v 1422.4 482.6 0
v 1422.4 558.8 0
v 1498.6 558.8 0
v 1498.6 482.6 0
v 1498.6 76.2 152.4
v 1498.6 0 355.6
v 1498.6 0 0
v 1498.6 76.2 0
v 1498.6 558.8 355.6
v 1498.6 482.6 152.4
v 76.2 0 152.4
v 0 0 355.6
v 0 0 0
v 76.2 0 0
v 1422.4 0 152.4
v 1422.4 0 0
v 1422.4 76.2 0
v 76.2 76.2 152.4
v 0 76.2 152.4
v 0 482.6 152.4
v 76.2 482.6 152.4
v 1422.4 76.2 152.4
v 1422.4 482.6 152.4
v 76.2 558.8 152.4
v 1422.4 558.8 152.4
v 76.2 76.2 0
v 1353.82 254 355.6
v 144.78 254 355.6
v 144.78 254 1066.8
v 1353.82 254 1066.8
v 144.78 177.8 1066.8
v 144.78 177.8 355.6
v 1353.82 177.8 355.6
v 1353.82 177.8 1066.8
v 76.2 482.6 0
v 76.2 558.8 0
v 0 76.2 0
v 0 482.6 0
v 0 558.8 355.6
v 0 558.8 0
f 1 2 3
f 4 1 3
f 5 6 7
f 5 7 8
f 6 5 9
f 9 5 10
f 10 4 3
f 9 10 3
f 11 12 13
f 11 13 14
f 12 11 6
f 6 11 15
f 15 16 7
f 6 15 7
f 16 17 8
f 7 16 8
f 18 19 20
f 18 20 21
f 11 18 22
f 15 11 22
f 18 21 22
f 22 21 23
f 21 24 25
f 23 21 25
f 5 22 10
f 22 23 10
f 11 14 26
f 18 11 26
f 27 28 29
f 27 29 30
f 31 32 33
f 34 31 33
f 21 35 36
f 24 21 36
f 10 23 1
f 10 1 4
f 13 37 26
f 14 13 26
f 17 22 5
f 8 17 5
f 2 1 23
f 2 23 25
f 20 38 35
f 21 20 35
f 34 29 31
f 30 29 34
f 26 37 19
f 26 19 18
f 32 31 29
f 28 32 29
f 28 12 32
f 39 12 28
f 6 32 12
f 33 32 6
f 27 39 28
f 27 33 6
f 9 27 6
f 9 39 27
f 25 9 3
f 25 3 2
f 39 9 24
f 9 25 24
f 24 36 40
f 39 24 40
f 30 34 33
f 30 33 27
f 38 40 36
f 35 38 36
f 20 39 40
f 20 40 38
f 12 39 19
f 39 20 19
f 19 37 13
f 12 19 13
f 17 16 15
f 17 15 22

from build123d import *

# Parameters (mm, degrees)
F0_W     = 76.2
F0_H     = 76.2
F1_DEPTH = 152.4
F2_DEPTH = 152.4
F3_W     = 76.2
F3_H     = 76.2
F4_DEPTH = 203.2
F5_W     = 1209.04
F5_H     = 76.2
F6_DEPTH = 711.2


with BuildPart() as f1:
    # F0 (on Top) → F1 (new body)
    with BuildSketch(Plane.XY):
        with Locations((38.1, 38.1)):
            Rectangle(F0_W, F0_H)
    extrude(amount=F1_DEPTH)



with BuildPart() as f2:
    # F0 (on Top) → F2 (new body)
    with BuildSketch(Plane.XY):
        with Locations((38.1, 520.7)):
            Rectangle(F0_W, F0_H)
    extrude(amount=F2_DEPTH)


with BuildPart() as f2b:
    # F0 (on Top) → F2, piece 2 (new body)
    with BuildSketch(Plane.XY):
        with Locations((1460.5, 520.7)):
            Rectangle(F0_W, F0_H)
    extrude(amount=F2_DEPTH)


with BuildPart() as f2c:
    # F0 (on Top) → F2, piece 3 (new body)
    with BuildSketch(Plane.XY):
        with Locations((1460.5, 38.1)):
            Rectangle(F0_W, F0_H)
    extrude(amount=F2_DEPTH)


with BuildPart() as f1_1:
    add(f1.part)

    add(f2.part)  # F4 merges F2

    add(f2b.part)  # F4 merges F2b

    add(f2c.part)  # F4 merges F2c
    # F3 (on face) → F4 (join)
    with BuildSketch(Plane.XY.offset(152.4)):
        Polygon((76.2, 76.2), (76.2, 0), (1498.6, 0), (1498.6, 558.8), (0, 558.8), (0, 76.2), align=None)
        with Locations((38.1, 38.1)):
            Rectangle(F3_W, F3_H)
    extrude(amount=F4_DEPTH)

    # F5 (on face) → F6 (join)
    with BuildSketch(Plane.XY.offset(355.6)):
        with Locations((749.3, 215.9)):
            Rectangle(F5_W, F5_H)
    extrude(amount=F6_DEPTH)


solid = f1_1.part
